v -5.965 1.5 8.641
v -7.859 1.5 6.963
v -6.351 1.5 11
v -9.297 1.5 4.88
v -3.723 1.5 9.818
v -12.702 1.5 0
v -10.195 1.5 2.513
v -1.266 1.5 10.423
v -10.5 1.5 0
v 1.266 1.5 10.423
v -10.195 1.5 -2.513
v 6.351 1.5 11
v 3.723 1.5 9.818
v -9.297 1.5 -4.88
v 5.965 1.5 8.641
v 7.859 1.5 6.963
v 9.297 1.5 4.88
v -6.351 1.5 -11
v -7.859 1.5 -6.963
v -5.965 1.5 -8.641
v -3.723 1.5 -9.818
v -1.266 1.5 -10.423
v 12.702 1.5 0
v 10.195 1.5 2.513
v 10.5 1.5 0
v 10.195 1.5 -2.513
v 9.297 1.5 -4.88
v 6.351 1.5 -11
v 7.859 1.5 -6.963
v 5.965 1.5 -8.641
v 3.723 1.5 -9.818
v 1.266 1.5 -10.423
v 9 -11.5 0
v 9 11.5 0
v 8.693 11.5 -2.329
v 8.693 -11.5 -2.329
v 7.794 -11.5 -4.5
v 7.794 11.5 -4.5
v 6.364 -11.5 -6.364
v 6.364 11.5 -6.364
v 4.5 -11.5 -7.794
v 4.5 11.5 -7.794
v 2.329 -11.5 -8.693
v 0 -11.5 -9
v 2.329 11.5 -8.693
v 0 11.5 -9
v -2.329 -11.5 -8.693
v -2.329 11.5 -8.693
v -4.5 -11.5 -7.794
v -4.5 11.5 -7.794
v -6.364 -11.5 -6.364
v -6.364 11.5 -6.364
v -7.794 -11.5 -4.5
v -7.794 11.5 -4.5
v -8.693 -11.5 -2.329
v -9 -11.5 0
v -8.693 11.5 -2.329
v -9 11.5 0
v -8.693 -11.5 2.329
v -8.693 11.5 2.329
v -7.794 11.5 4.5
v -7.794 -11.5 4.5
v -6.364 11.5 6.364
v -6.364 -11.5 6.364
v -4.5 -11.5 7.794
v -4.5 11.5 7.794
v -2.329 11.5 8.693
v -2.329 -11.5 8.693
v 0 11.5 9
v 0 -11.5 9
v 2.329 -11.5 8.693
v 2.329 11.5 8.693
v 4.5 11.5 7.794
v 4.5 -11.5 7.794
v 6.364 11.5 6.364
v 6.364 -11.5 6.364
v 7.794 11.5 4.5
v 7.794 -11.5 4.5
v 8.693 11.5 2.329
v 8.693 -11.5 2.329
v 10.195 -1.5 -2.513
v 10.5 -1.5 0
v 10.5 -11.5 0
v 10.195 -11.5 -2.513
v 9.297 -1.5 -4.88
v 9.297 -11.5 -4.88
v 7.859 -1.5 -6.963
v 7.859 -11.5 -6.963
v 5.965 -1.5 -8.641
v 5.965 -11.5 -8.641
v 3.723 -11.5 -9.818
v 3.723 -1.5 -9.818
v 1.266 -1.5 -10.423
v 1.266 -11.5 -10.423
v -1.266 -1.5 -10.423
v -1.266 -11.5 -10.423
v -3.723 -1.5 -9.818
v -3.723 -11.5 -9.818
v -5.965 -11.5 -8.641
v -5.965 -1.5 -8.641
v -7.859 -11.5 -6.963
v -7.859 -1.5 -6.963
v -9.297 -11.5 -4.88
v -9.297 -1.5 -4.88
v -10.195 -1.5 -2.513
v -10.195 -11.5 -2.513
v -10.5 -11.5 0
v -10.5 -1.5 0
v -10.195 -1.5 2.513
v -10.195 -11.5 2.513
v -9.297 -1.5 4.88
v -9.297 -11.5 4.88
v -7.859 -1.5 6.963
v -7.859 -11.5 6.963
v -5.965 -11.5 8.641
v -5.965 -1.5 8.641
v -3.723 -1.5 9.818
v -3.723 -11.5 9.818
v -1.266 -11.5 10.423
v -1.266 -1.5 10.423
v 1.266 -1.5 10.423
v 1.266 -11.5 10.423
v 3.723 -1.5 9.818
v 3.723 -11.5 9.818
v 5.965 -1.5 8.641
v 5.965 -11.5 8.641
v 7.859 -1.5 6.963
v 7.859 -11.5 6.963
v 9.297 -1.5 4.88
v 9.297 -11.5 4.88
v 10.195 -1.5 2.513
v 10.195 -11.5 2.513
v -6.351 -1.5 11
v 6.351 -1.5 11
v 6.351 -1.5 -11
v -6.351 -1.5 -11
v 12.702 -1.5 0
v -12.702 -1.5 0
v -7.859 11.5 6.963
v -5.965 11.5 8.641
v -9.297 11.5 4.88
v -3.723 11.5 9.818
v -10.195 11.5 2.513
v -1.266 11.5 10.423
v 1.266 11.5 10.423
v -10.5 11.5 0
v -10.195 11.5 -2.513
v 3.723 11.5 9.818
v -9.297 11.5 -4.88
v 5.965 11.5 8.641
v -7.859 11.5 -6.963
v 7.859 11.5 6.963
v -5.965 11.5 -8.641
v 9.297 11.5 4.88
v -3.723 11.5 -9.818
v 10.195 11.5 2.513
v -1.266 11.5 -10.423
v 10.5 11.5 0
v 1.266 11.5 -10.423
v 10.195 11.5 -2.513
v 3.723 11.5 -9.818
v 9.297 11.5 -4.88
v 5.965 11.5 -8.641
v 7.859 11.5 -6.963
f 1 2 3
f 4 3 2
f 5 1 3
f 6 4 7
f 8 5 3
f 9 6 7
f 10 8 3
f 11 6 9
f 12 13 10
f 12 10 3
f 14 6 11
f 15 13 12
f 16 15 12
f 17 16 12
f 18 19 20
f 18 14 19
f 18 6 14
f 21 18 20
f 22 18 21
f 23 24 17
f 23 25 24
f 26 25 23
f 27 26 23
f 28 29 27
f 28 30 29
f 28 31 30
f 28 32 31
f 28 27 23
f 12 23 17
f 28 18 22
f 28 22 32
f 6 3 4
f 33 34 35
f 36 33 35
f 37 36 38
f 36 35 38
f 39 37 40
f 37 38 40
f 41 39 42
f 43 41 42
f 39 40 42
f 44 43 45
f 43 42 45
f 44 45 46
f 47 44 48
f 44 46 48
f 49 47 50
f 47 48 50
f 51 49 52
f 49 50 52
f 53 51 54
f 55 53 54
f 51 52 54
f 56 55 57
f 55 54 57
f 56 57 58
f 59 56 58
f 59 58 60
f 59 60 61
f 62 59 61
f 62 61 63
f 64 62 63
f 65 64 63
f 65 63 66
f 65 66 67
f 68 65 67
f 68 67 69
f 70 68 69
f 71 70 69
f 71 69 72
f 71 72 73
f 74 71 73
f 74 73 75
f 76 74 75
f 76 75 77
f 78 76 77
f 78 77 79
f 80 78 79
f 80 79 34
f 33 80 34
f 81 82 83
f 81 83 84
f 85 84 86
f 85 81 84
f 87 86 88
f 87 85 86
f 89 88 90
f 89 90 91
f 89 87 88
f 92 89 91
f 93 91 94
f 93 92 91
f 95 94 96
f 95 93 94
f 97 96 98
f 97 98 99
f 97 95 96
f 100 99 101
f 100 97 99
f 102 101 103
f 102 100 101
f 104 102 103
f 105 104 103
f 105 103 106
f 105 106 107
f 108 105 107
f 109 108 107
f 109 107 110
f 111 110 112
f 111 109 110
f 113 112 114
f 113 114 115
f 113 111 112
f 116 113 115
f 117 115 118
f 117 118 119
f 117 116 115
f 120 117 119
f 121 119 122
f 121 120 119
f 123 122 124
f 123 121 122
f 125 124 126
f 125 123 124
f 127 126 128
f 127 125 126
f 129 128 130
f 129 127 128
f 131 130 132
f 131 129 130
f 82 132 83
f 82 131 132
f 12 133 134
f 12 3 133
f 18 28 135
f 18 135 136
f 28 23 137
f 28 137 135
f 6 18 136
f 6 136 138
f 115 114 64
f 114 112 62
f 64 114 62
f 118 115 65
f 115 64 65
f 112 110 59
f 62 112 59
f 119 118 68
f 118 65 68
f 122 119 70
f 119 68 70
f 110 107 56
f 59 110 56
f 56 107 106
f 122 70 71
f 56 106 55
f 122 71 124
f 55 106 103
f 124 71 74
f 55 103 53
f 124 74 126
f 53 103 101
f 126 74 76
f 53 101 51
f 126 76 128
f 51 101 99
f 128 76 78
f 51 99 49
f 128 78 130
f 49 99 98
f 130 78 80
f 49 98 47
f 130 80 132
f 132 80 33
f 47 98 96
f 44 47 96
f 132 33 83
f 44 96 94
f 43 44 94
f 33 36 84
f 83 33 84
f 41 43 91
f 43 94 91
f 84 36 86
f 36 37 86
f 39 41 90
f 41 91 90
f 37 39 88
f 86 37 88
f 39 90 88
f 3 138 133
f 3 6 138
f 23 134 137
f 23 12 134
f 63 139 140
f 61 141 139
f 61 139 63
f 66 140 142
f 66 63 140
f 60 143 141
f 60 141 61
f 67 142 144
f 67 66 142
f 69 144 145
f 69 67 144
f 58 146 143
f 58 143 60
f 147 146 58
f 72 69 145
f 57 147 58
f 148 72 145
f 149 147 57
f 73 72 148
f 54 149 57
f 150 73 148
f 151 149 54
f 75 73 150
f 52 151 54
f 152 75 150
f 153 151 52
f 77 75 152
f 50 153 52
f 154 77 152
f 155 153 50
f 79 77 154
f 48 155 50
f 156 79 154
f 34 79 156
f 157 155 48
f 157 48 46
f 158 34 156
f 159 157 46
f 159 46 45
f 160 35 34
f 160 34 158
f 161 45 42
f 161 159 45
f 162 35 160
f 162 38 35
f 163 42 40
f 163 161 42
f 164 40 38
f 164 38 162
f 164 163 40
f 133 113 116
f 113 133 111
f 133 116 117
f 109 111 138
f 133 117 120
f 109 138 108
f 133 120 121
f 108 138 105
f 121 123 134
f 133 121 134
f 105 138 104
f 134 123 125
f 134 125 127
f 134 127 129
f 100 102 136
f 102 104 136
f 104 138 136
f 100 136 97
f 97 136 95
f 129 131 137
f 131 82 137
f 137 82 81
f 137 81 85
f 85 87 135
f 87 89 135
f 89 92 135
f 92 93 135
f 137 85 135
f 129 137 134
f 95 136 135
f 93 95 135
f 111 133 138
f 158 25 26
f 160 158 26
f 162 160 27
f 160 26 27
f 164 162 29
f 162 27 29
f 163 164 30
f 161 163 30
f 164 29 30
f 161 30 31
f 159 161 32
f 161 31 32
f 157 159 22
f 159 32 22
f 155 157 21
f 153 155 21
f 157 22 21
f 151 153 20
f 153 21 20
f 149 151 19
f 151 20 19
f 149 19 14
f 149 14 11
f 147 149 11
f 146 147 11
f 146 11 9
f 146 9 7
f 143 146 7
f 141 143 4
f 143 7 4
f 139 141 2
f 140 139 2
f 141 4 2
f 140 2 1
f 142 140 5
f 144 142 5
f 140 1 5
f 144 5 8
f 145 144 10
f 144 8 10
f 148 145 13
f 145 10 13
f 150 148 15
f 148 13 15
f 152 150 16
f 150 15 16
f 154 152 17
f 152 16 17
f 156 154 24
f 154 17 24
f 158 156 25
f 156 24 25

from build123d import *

# Parameters (mm, degrees)
BOSS_EXTRUDE1_DEPTH = 1.5
SKETCH2_R           = 10.5
BOSS_EXTRUDE2_DEPTH = 10
SKETCH3_R           = 9
CUT_EXTRUDE1_DEPTH  = 24


with BuildPart() as part:
    # Sketch1 → Boss-Extrude1 (new body, symmetric)
    with BuildSketch(Plane(origin=(0, 0, 0), x_dir=(1, 0, 0), z_dir=(0, 1, 0))):
        Polygon((6.350852961, -11), (12.701705922, 0), (6.350852961, 11), (-6.350852961, 11), (-12.701705922, 0), (-6.350852961, -11), align=None)
    extrude(amount=BOSS_EXTRUDE1_DEPTH, both=True)

    # Sketch2 → Boss-Extrude2 (add)
    with BuildSketch(Plane(origin=(0, 1.5, 0), x_dir=(1, 0, 0), z_dir=(0, 1, 0))):
        Circle(SKETCH2_R)
    boss_extrude2 = extrude(amount=BOSS_EXTRUDE2_DEPTH)

    # Mirror1: Boss-Extrude2 across plane
    add(boss_extrude2.mirror(Plane.ZX))

    # Sketch3 → Cut-Extrude1 (cut, through all)
    with BuildSketch(Plane(origin=(0, 11.5, 0), x_dir=(1, 0, 0), z_dir=(0, 1, 0))):
        Circle(SKETCH3_R)
    extrude(amount=-CUT_EXTRUDE1_DEPTH, mode=Mode.SUBTRACT)


solid = part.part
